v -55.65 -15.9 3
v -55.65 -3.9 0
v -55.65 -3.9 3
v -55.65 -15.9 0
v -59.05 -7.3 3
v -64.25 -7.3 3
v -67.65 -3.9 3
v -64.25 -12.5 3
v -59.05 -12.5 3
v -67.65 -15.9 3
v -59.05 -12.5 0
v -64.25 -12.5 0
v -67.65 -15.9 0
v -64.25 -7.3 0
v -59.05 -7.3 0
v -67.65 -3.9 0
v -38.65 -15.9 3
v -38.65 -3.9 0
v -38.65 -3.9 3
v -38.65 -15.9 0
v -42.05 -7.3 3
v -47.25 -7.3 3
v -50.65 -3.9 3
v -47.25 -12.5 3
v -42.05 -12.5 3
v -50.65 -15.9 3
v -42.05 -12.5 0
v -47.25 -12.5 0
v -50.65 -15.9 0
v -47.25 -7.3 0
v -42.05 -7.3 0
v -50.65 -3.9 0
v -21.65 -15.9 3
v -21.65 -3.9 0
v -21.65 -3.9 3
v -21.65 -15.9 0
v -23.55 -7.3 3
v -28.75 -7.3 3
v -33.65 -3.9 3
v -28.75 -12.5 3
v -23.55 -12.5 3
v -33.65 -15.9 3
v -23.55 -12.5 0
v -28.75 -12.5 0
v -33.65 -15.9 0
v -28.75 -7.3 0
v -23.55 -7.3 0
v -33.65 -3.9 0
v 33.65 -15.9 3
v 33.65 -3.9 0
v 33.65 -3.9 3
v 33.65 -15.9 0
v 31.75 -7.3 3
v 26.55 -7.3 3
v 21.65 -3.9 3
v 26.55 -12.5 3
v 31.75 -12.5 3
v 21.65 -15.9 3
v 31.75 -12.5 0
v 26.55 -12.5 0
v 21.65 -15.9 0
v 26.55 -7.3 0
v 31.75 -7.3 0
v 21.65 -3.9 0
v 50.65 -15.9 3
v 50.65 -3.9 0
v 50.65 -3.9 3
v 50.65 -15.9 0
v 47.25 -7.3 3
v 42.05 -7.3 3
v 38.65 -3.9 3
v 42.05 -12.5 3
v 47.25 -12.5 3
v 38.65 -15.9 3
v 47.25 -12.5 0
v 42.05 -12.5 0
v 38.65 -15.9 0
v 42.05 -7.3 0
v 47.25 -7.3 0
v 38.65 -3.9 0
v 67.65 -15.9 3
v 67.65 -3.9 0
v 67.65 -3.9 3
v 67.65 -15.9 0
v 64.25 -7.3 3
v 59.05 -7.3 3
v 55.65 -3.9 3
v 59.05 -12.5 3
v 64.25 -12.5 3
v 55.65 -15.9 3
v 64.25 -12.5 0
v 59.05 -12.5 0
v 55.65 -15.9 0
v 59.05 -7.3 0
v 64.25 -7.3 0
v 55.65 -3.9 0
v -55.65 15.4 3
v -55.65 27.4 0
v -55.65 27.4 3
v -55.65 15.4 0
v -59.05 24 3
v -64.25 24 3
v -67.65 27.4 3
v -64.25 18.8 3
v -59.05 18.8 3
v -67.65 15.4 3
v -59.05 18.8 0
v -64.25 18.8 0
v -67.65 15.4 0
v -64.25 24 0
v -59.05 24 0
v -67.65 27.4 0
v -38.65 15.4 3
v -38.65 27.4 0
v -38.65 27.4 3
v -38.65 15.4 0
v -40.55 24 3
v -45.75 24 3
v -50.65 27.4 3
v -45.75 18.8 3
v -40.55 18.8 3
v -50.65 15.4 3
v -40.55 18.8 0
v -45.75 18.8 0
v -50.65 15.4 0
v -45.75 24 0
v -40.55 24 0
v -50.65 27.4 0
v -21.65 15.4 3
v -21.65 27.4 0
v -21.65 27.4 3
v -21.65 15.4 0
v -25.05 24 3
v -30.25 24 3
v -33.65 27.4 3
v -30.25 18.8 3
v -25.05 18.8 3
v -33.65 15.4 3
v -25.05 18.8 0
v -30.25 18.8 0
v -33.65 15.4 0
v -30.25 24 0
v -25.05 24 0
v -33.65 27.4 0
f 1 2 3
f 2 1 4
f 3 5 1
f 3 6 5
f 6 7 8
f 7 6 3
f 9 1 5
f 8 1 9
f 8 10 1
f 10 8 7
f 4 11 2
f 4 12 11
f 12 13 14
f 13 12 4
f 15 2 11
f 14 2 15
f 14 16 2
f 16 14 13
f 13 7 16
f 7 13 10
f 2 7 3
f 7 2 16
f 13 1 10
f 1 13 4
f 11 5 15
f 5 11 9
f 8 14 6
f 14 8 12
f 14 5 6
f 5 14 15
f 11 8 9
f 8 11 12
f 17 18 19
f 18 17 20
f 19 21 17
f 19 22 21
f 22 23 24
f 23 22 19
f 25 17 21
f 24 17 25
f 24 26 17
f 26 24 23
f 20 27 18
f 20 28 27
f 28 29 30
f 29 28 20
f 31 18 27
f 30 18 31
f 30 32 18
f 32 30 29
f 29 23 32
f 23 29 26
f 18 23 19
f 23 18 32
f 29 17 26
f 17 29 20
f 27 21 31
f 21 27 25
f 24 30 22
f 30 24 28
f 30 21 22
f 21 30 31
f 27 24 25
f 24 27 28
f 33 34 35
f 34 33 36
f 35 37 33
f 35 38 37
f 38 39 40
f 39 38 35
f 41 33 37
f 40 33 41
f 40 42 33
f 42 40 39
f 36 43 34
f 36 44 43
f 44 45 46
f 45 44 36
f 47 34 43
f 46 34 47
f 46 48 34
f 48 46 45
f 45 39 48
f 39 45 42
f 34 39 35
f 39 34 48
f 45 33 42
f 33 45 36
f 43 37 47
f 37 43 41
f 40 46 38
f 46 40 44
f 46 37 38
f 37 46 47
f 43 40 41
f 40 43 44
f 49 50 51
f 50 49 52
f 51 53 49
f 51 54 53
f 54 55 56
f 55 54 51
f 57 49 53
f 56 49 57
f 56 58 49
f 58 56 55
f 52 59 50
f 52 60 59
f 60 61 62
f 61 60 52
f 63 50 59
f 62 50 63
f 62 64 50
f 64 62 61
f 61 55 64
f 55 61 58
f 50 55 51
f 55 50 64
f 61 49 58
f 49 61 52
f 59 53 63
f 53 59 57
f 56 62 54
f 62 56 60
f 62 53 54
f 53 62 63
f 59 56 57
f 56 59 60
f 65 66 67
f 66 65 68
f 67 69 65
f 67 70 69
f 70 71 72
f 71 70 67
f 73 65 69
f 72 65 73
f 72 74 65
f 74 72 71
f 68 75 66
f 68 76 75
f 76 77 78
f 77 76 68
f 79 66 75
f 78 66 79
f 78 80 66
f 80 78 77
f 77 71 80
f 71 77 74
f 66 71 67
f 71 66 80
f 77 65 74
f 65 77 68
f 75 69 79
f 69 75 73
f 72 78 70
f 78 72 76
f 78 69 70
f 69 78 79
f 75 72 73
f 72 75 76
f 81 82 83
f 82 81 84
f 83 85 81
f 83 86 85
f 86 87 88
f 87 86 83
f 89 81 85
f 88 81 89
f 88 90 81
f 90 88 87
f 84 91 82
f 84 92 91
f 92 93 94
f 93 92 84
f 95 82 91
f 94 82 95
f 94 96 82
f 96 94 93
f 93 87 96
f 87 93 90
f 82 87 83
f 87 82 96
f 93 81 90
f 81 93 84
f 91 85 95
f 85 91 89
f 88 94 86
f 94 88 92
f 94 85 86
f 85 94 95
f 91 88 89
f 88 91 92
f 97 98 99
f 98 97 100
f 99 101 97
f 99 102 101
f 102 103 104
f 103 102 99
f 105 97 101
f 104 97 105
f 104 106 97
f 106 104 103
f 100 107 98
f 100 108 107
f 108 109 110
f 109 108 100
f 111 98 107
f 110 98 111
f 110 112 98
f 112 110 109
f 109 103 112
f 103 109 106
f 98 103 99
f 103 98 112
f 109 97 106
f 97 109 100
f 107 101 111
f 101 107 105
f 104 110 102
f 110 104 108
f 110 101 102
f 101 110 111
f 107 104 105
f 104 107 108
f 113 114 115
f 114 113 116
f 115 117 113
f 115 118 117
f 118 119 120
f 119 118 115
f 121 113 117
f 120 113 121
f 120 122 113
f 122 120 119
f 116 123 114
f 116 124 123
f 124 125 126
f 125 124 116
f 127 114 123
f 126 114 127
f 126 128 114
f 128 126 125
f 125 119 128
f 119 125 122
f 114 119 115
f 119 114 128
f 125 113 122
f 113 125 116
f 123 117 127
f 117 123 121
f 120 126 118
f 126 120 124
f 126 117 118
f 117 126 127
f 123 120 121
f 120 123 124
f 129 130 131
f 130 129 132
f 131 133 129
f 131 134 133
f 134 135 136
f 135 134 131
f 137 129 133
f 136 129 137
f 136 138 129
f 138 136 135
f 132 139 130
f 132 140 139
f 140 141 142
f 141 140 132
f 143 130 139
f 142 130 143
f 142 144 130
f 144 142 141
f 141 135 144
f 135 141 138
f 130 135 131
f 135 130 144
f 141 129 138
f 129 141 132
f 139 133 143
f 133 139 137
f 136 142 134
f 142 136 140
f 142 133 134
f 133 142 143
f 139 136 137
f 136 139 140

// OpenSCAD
$fn = 50;

difference() {
	union() {
		translate(v = [-61.650000000000006, -9.899999999999999, 0]) {
			rotate(a = [0, 0, 0]) {
				difference() {
					union() {
						translate(v = [-6.0, -6.0, 0]) {
							cube(size = [12.0, 12.0, 3.0]);
						}
					}
					union() {
						translate(v = [-2.6, -2.6, -0.1]) {
							cube(size = [5.2, 5.2, 3.2]);
						}
					}
				}
			}
		}
		translate(v = [-44.650000000000006, -9.899999999999999, 0]) {
			rotate(a = [0, 0, 0]) {
				difference() {
					union() {
						translate(v = [-6.0, -6.0, 0]) {
							cube(size = [12.0, 12.0, 3.0]);
						}
					}
					union() {
						translate(v = [-2.6, -2.6, -0.1]) {
							cube(size = [5.2, 5.2, 3.2]);
						}
					}
				}
			}
		}
		translate(v = [-27.650000000000006, -9.899999999999999, 0]) {
			rotate(a = [0, 0, 0]) {
				difference() {
					union() {
						translate(v = [-6.0, -6.0, 0]) {
							cube(size = [12.0, 12.0, 3.0]);
						}
					}
					union() {
						translate(v = [-1.1, -2.6, -0.1]) {
							cube(size = [5.2, 5.2, 3.2]);
						}
					}
				}
			}
		}
		translate(v = [27.64999999999999, -9.899999999999999, 0]) {
			rotate(a = [0, 0, 0]) {
				difference() {
					union() {
						translate(v = [-6.0, -6.0, 0]) {
							cube(size = [12.0, 12.0, 3.0]);
						}
					}
					union() {
						translate(v = [-1.1, -2.6, -0.1]) {
							cube(size = [5.2, 5.2, 3.2]);
						}
					}
				}
			}
		}
		translate(v = [44.64999999999999, -9.899999999999999, 0]) {
			rotate(a = [0, 0, 0]) {
				difference() {
					union() {
						translate(v = [-6.0, -6.0, 0]) {
							cube(size = [12.0, 12.0, 3.0]);
						}
					}
					union() {
						translate(v = [-2.6, -2.6, -0.1]) {
							cube(size = [5.2, 5.2, 3.2]);
						}
					}
				}
			}
		}
		translate(v = [61.64999999999999, -9.899999999999999, 0]) {
			rotate(a = [0, 0, 0]) {
				difference() {
					union() {
						translate(v = [-6.0, -6.0, 0]) {
							cube(size = [12.0, 12.0, 3.0]);
						}
					}
					union() {
						translate(v = [-2.6, -2.6, -0.1]) {
							cube(size = [5.2, 5.2, 3.2]);
						}
					}
				}
			}
		}
		translate(v = [-61.650000000000006, 21.400000000000002, 0]) {
			rotate(a = [0, 0, 0]) {
				difference() {
					union() {
						translate(v = [-6.0, -6.0, 0]) {
							cube(size = [12.0, 12.0, 3.0]);
						}
					}
					union() {
						translate(v = [-2.6, -2.6, -0.1]) {
							cube(size = [5.2, 5.2, 3.2]);
						}
					}
				}
			}
		}
		translate(v = [-44.650000000000006, 21.400000000000002, 0]) {
			rotate(a = [0, 0, 0]) {
				difference() {
					union() {
						translate(v = [-6.0, -6.0, 0]) {
							cube(size = [12.0, 12.0, 3.0]);
						}
					}
					union() {
						translate(v = [-1.1, -2.6, -0.1]) {
							cube(size = [5.2, 5.2, 3.2]);
						}
					}
				}
			}
		}
		translate(v = [-27.650000000000006, 21.400000000000002, 0]) {
			rotate(a = [0, 0, 0]) {
				difference() {
					union() {
						translate(v = [-6.0, -6.0, 0]) {
							cube(size = [12.0, 12.0, 3.0]);
						}
					}
					union() {
						translate(v = [-2.6, -2.6, -0.1]) {
							cube(size = [5.2, 5.2, 3.2]);
						}
					}
				}
			}
		}
	}
	union();
}
